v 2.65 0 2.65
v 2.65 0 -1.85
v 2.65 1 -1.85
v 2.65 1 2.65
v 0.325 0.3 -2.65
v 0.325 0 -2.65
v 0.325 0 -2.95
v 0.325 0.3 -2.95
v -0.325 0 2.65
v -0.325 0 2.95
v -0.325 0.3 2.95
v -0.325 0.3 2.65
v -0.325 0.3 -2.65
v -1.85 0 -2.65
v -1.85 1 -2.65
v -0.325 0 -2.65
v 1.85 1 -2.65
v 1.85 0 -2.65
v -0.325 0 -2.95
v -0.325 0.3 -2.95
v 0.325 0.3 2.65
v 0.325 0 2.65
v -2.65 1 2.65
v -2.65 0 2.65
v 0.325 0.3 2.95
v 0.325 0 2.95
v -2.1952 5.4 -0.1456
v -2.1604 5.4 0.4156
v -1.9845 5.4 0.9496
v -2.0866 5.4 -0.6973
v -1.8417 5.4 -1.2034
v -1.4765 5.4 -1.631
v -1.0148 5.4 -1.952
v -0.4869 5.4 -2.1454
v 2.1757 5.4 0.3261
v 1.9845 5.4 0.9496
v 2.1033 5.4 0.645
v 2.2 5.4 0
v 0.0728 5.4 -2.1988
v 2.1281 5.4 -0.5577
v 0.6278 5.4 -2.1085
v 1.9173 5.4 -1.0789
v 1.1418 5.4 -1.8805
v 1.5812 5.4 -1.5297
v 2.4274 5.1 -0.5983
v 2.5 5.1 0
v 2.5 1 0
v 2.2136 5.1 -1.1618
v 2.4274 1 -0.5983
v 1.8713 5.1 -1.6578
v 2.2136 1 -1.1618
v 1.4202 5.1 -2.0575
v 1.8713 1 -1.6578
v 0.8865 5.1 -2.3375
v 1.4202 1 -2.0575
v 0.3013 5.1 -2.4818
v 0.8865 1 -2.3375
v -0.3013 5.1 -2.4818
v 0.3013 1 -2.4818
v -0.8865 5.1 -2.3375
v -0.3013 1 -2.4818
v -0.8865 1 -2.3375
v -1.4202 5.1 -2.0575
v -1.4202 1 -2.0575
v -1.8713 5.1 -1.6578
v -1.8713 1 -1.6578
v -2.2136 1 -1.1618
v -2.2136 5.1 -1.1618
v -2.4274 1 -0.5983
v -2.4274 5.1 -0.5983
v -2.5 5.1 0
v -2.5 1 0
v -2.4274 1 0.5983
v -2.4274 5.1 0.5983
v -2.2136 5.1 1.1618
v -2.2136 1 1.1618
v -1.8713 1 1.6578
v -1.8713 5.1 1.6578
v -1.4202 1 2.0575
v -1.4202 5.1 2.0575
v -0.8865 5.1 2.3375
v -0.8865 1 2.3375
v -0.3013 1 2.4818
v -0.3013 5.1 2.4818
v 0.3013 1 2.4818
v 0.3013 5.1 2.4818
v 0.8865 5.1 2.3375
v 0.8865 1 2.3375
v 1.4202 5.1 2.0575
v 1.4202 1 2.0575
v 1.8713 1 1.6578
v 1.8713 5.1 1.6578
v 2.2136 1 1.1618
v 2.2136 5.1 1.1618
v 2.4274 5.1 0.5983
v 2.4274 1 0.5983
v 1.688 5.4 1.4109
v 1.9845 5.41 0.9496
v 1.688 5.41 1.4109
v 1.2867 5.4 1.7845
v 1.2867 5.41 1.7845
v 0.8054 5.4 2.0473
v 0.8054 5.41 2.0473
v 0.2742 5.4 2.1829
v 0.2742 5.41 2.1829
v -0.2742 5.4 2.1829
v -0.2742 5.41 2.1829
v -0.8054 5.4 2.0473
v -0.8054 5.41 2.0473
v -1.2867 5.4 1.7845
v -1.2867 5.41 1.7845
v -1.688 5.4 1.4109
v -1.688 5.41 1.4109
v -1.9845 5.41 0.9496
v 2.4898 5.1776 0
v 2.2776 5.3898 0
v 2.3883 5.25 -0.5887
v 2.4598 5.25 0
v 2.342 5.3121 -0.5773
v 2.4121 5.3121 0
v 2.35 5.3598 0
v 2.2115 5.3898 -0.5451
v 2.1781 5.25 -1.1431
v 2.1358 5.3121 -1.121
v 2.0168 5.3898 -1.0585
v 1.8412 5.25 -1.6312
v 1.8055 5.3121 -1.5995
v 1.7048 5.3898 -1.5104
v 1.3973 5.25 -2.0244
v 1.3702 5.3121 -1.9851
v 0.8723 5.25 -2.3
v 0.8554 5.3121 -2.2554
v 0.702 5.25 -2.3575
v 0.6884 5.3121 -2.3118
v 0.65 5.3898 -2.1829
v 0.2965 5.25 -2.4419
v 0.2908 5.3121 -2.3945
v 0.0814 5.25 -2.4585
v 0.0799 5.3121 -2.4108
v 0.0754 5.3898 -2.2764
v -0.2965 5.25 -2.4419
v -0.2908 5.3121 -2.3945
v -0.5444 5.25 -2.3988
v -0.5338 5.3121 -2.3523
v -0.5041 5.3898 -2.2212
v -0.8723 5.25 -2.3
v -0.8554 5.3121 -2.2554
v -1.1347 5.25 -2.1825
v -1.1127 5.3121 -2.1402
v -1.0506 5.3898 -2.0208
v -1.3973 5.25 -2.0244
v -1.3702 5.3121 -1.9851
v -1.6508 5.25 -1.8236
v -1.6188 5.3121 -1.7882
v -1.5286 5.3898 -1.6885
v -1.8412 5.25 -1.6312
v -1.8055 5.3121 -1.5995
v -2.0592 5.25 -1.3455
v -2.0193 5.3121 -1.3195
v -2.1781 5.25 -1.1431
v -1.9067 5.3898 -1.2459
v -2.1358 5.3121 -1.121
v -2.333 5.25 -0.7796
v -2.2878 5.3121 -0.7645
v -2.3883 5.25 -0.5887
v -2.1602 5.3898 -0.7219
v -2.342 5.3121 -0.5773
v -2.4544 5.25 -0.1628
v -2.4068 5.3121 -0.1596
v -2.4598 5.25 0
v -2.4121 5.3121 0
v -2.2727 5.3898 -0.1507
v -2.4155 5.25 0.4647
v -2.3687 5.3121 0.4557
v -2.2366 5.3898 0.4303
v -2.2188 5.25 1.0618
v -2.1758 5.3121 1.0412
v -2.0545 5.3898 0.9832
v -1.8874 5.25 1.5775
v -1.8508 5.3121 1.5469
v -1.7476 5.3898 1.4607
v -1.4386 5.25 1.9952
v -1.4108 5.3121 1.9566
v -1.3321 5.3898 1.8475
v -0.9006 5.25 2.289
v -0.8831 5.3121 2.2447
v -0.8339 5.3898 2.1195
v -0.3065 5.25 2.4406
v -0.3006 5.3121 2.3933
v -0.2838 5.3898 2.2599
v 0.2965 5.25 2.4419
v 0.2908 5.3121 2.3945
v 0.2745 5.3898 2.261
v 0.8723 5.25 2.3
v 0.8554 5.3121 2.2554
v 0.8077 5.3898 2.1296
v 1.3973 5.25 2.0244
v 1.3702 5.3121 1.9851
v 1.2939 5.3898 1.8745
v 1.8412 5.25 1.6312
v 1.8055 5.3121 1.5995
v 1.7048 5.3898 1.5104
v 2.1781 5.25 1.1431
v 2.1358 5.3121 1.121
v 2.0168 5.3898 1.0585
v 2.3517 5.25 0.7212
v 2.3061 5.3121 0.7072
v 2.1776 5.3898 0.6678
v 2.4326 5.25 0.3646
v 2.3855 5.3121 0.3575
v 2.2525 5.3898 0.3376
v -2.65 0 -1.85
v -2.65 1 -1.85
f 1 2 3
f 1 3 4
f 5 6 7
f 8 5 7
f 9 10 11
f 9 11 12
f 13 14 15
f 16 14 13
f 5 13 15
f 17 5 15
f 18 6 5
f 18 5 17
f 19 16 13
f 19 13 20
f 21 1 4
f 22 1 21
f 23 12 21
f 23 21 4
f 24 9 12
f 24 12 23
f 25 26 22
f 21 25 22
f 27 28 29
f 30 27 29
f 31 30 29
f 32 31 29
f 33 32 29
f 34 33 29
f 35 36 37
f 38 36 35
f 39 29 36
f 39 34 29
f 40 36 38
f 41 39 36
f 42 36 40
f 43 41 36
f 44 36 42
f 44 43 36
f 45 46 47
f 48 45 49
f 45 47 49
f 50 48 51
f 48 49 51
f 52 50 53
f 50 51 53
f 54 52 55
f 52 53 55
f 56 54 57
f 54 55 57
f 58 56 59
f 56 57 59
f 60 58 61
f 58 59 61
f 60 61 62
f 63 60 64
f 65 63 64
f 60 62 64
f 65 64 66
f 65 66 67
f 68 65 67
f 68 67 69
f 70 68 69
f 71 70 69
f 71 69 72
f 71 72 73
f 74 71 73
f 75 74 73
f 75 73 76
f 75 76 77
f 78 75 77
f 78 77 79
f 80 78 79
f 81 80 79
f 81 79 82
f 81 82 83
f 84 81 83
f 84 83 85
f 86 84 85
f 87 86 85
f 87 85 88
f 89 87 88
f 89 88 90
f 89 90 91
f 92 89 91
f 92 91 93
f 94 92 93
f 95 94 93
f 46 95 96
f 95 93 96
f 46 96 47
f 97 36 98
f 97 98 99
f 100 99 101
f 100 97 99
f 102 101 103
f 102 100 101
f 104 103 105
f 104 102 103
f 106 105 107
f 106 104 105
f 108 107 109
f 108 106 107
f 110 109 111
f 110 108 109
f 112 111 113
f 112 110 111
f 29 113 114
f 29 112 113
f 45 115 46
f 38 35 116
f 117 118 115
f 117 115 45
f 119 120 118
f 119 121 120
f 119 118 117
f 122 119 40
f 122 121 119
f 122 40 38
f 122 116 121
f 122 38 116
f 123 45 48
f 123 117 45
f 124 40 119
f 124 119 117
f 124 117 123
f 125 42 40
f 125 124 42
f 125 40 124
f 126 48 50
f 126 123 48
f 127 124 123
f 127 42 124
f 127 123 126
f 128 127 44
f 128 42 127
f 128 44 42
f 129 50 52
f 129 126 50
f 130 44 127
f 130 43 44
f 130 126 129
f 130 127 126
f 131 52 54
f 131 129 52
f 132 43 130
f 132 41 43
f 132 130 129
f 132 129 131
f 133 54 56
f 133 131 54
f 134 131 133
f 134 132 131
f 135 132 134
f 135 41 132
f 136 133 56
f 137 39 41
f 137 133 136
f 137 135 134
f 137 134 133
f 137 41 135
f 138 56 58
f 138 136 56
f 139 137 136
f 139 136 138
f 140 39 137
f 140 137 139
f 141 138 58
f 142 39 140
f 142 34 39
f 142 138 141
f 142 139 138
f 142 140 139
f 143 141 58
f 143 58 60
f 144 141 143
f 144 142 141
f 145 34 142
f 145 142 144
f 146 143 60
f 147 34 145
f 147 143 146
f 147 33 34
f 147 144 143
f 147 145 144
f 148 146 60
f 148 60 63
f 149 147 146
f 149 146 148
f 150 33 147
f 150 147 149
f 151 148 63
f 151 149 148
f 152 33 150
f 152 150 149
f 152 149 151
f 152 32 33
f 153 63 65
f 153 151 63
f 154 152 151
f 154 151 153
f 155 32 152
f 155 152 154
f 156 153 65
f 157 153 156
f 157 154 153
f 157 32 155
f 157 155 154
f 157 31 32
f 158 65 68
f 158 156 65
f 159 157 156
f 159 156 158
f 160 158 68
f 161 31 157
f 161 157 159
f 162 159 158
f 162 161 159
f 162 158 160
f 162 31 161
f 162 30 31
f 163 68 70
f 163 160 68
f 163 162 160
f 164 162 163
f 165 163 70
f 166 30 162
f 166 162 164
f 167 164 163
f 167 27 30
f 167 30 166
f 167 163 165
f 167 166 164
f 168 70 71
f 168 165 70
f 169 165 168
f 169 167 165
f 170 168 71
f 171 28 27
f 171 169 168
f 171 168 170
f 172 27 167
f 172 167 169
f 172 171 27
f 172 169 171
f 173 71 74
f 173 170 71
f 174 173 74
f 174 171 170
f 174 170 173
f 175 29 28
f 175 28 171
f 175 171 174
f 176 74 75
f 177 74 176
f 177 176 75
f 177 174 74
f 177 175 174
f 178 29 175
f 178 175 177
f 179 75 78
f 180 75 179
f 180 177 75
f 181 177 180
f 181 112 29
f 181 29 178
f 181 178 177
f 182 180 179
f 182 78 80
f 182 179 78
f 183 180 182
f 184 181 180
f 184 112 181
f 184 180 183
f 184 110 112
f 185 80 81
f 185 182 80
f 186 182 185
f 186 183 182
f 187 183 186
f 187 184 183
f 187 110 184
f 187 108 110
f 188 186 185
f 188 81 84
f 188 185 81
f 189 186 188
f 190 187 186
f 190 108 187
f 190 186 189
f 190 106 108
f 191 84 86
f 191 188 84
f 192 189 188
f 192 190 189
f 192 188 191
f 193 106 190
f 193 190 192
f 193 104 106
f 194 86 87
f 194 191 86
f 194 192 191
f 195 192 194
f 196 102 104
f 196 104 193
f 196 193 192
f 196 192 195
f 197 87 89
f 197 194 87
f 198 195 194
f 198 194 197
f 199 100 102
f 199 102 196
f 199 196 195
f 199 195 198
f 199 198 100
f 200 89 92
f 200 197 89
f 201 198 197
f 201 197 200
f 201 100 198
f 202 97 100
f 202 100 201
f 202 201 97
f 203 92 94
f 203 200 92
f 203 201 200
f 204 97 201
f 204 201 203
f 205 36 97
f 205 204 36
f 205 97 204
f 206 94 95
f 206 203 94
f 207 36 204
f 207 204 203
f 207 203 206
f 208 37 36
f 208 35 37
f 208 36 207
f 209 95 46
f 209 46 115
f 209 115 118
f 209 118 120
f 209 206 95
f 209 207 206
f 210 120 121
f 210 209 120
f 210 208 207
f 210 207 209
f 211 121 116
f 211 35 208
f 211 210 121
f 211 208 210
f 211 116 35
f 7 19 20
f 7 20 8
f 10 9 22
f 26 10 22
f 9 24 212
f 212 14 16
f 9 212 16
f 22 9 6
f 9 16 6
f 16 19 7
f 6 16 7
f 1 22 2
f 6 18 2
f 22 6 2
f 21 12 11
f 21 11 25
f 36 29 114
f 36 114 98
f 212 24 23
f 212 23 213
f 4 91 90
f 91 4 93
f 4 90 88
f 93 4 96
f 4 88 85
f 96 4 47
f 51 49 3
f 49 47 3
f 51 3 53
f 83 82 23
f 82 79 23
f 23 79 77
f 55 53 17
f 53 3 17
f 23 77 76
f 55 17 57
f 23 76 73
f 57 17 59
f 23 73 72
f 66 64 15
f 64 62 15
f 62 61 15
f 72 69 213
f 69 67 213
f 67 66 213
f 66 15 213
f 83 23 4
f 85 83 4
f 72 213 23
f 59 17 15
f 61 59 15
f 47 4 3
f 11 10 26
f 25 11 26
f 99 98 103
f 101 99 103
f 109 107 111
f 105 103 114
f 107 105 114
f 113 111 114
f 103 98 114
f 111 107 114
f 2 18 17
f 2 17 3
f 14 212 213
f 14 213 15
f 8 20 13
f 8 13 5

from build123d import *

# Parameters (mm, degrees)
BOSS_EXTRUDE1_DEPTH = 1
SKETCH3_R           = 2.5
BOSS_EXTRUDE2_DEPTH = 5.4
FILLET1_R           = 0.3
SKETCH4_W           = 0.65
SKETCH4_H           = 2.2
BOSS_EXTRUDE3_DEPTH = 0.3
BOSS_EXTRUDE4_DEPTH = 0.01


with BuildPart() as part:
    # Sketch2 → Boss-Extrude1 (new body)
    with BuildSketch(Plane(origin=(0, 0, 0), x_dir=(1, 0, 0), z_dir=(0, 1, 0))):
        Polygon((2.65, -2.65), (-2.65, -2.65), (-2.65, 1.85), (-1.85, 2.65), (1.85, 2.65), (2.65, 1.85), align=None)
    extrude(amount=BOSS_EXTRUDE1_DEPTH)

    # Sketch3 → Boss-Extrude2 (add)
    with BuildSketch(Plane(origin=(0, 0, 0), x_dir=(1, 0, 0), z_dir=(0, 1, 0))):
        Circle(SKETCH3_R)
    extrude(amount=BOSS_EXTRUDE2_DEPTH)

    # Fillet1
    fillet1_edges = [part.edges().sort_by_distance(p)[0] for p in [
        (-2.5, 5.4, 0),
    ]]
    fillet(fillet1_edges, radius=FILLET1_R)

    # Sketch4 → Boss-Extrude3 (add)
    with BuildSketch(Plane(origin=(0, 0, 0), x_dir=(1, 0, 0), z_dir=(0, 1, 0))):
        with Locations((0, 1.85)):
            Rectangle(SKETCH4_W, SKETCH4_H)
        with Locations((0, -1.85)):
            Rectangle(SKETCH4_W, SKETCH4_H)
    extrude(amount=BOSS_EXTRUDE3_DEPTH)

    # Sketch5 → Boss-Extrude4 (add)
    with BuildSketch(Plane(origin=(0, 5.4, 0), x_dir=(1, 0, 0), z_dir=(0, 1, 0))):
        with BuildLine():
            Line((-1.984482533, -0.949646816), (1.984482533, -0.949646816))
            ThreePointArc((1.984482533, -0.949646816), (0, -2.2), (-1.984482533, -0.949646816))
        make_face()
    extrude(amount=BOSS_EXTRUDE4_DEPTH)


solid = part.part
